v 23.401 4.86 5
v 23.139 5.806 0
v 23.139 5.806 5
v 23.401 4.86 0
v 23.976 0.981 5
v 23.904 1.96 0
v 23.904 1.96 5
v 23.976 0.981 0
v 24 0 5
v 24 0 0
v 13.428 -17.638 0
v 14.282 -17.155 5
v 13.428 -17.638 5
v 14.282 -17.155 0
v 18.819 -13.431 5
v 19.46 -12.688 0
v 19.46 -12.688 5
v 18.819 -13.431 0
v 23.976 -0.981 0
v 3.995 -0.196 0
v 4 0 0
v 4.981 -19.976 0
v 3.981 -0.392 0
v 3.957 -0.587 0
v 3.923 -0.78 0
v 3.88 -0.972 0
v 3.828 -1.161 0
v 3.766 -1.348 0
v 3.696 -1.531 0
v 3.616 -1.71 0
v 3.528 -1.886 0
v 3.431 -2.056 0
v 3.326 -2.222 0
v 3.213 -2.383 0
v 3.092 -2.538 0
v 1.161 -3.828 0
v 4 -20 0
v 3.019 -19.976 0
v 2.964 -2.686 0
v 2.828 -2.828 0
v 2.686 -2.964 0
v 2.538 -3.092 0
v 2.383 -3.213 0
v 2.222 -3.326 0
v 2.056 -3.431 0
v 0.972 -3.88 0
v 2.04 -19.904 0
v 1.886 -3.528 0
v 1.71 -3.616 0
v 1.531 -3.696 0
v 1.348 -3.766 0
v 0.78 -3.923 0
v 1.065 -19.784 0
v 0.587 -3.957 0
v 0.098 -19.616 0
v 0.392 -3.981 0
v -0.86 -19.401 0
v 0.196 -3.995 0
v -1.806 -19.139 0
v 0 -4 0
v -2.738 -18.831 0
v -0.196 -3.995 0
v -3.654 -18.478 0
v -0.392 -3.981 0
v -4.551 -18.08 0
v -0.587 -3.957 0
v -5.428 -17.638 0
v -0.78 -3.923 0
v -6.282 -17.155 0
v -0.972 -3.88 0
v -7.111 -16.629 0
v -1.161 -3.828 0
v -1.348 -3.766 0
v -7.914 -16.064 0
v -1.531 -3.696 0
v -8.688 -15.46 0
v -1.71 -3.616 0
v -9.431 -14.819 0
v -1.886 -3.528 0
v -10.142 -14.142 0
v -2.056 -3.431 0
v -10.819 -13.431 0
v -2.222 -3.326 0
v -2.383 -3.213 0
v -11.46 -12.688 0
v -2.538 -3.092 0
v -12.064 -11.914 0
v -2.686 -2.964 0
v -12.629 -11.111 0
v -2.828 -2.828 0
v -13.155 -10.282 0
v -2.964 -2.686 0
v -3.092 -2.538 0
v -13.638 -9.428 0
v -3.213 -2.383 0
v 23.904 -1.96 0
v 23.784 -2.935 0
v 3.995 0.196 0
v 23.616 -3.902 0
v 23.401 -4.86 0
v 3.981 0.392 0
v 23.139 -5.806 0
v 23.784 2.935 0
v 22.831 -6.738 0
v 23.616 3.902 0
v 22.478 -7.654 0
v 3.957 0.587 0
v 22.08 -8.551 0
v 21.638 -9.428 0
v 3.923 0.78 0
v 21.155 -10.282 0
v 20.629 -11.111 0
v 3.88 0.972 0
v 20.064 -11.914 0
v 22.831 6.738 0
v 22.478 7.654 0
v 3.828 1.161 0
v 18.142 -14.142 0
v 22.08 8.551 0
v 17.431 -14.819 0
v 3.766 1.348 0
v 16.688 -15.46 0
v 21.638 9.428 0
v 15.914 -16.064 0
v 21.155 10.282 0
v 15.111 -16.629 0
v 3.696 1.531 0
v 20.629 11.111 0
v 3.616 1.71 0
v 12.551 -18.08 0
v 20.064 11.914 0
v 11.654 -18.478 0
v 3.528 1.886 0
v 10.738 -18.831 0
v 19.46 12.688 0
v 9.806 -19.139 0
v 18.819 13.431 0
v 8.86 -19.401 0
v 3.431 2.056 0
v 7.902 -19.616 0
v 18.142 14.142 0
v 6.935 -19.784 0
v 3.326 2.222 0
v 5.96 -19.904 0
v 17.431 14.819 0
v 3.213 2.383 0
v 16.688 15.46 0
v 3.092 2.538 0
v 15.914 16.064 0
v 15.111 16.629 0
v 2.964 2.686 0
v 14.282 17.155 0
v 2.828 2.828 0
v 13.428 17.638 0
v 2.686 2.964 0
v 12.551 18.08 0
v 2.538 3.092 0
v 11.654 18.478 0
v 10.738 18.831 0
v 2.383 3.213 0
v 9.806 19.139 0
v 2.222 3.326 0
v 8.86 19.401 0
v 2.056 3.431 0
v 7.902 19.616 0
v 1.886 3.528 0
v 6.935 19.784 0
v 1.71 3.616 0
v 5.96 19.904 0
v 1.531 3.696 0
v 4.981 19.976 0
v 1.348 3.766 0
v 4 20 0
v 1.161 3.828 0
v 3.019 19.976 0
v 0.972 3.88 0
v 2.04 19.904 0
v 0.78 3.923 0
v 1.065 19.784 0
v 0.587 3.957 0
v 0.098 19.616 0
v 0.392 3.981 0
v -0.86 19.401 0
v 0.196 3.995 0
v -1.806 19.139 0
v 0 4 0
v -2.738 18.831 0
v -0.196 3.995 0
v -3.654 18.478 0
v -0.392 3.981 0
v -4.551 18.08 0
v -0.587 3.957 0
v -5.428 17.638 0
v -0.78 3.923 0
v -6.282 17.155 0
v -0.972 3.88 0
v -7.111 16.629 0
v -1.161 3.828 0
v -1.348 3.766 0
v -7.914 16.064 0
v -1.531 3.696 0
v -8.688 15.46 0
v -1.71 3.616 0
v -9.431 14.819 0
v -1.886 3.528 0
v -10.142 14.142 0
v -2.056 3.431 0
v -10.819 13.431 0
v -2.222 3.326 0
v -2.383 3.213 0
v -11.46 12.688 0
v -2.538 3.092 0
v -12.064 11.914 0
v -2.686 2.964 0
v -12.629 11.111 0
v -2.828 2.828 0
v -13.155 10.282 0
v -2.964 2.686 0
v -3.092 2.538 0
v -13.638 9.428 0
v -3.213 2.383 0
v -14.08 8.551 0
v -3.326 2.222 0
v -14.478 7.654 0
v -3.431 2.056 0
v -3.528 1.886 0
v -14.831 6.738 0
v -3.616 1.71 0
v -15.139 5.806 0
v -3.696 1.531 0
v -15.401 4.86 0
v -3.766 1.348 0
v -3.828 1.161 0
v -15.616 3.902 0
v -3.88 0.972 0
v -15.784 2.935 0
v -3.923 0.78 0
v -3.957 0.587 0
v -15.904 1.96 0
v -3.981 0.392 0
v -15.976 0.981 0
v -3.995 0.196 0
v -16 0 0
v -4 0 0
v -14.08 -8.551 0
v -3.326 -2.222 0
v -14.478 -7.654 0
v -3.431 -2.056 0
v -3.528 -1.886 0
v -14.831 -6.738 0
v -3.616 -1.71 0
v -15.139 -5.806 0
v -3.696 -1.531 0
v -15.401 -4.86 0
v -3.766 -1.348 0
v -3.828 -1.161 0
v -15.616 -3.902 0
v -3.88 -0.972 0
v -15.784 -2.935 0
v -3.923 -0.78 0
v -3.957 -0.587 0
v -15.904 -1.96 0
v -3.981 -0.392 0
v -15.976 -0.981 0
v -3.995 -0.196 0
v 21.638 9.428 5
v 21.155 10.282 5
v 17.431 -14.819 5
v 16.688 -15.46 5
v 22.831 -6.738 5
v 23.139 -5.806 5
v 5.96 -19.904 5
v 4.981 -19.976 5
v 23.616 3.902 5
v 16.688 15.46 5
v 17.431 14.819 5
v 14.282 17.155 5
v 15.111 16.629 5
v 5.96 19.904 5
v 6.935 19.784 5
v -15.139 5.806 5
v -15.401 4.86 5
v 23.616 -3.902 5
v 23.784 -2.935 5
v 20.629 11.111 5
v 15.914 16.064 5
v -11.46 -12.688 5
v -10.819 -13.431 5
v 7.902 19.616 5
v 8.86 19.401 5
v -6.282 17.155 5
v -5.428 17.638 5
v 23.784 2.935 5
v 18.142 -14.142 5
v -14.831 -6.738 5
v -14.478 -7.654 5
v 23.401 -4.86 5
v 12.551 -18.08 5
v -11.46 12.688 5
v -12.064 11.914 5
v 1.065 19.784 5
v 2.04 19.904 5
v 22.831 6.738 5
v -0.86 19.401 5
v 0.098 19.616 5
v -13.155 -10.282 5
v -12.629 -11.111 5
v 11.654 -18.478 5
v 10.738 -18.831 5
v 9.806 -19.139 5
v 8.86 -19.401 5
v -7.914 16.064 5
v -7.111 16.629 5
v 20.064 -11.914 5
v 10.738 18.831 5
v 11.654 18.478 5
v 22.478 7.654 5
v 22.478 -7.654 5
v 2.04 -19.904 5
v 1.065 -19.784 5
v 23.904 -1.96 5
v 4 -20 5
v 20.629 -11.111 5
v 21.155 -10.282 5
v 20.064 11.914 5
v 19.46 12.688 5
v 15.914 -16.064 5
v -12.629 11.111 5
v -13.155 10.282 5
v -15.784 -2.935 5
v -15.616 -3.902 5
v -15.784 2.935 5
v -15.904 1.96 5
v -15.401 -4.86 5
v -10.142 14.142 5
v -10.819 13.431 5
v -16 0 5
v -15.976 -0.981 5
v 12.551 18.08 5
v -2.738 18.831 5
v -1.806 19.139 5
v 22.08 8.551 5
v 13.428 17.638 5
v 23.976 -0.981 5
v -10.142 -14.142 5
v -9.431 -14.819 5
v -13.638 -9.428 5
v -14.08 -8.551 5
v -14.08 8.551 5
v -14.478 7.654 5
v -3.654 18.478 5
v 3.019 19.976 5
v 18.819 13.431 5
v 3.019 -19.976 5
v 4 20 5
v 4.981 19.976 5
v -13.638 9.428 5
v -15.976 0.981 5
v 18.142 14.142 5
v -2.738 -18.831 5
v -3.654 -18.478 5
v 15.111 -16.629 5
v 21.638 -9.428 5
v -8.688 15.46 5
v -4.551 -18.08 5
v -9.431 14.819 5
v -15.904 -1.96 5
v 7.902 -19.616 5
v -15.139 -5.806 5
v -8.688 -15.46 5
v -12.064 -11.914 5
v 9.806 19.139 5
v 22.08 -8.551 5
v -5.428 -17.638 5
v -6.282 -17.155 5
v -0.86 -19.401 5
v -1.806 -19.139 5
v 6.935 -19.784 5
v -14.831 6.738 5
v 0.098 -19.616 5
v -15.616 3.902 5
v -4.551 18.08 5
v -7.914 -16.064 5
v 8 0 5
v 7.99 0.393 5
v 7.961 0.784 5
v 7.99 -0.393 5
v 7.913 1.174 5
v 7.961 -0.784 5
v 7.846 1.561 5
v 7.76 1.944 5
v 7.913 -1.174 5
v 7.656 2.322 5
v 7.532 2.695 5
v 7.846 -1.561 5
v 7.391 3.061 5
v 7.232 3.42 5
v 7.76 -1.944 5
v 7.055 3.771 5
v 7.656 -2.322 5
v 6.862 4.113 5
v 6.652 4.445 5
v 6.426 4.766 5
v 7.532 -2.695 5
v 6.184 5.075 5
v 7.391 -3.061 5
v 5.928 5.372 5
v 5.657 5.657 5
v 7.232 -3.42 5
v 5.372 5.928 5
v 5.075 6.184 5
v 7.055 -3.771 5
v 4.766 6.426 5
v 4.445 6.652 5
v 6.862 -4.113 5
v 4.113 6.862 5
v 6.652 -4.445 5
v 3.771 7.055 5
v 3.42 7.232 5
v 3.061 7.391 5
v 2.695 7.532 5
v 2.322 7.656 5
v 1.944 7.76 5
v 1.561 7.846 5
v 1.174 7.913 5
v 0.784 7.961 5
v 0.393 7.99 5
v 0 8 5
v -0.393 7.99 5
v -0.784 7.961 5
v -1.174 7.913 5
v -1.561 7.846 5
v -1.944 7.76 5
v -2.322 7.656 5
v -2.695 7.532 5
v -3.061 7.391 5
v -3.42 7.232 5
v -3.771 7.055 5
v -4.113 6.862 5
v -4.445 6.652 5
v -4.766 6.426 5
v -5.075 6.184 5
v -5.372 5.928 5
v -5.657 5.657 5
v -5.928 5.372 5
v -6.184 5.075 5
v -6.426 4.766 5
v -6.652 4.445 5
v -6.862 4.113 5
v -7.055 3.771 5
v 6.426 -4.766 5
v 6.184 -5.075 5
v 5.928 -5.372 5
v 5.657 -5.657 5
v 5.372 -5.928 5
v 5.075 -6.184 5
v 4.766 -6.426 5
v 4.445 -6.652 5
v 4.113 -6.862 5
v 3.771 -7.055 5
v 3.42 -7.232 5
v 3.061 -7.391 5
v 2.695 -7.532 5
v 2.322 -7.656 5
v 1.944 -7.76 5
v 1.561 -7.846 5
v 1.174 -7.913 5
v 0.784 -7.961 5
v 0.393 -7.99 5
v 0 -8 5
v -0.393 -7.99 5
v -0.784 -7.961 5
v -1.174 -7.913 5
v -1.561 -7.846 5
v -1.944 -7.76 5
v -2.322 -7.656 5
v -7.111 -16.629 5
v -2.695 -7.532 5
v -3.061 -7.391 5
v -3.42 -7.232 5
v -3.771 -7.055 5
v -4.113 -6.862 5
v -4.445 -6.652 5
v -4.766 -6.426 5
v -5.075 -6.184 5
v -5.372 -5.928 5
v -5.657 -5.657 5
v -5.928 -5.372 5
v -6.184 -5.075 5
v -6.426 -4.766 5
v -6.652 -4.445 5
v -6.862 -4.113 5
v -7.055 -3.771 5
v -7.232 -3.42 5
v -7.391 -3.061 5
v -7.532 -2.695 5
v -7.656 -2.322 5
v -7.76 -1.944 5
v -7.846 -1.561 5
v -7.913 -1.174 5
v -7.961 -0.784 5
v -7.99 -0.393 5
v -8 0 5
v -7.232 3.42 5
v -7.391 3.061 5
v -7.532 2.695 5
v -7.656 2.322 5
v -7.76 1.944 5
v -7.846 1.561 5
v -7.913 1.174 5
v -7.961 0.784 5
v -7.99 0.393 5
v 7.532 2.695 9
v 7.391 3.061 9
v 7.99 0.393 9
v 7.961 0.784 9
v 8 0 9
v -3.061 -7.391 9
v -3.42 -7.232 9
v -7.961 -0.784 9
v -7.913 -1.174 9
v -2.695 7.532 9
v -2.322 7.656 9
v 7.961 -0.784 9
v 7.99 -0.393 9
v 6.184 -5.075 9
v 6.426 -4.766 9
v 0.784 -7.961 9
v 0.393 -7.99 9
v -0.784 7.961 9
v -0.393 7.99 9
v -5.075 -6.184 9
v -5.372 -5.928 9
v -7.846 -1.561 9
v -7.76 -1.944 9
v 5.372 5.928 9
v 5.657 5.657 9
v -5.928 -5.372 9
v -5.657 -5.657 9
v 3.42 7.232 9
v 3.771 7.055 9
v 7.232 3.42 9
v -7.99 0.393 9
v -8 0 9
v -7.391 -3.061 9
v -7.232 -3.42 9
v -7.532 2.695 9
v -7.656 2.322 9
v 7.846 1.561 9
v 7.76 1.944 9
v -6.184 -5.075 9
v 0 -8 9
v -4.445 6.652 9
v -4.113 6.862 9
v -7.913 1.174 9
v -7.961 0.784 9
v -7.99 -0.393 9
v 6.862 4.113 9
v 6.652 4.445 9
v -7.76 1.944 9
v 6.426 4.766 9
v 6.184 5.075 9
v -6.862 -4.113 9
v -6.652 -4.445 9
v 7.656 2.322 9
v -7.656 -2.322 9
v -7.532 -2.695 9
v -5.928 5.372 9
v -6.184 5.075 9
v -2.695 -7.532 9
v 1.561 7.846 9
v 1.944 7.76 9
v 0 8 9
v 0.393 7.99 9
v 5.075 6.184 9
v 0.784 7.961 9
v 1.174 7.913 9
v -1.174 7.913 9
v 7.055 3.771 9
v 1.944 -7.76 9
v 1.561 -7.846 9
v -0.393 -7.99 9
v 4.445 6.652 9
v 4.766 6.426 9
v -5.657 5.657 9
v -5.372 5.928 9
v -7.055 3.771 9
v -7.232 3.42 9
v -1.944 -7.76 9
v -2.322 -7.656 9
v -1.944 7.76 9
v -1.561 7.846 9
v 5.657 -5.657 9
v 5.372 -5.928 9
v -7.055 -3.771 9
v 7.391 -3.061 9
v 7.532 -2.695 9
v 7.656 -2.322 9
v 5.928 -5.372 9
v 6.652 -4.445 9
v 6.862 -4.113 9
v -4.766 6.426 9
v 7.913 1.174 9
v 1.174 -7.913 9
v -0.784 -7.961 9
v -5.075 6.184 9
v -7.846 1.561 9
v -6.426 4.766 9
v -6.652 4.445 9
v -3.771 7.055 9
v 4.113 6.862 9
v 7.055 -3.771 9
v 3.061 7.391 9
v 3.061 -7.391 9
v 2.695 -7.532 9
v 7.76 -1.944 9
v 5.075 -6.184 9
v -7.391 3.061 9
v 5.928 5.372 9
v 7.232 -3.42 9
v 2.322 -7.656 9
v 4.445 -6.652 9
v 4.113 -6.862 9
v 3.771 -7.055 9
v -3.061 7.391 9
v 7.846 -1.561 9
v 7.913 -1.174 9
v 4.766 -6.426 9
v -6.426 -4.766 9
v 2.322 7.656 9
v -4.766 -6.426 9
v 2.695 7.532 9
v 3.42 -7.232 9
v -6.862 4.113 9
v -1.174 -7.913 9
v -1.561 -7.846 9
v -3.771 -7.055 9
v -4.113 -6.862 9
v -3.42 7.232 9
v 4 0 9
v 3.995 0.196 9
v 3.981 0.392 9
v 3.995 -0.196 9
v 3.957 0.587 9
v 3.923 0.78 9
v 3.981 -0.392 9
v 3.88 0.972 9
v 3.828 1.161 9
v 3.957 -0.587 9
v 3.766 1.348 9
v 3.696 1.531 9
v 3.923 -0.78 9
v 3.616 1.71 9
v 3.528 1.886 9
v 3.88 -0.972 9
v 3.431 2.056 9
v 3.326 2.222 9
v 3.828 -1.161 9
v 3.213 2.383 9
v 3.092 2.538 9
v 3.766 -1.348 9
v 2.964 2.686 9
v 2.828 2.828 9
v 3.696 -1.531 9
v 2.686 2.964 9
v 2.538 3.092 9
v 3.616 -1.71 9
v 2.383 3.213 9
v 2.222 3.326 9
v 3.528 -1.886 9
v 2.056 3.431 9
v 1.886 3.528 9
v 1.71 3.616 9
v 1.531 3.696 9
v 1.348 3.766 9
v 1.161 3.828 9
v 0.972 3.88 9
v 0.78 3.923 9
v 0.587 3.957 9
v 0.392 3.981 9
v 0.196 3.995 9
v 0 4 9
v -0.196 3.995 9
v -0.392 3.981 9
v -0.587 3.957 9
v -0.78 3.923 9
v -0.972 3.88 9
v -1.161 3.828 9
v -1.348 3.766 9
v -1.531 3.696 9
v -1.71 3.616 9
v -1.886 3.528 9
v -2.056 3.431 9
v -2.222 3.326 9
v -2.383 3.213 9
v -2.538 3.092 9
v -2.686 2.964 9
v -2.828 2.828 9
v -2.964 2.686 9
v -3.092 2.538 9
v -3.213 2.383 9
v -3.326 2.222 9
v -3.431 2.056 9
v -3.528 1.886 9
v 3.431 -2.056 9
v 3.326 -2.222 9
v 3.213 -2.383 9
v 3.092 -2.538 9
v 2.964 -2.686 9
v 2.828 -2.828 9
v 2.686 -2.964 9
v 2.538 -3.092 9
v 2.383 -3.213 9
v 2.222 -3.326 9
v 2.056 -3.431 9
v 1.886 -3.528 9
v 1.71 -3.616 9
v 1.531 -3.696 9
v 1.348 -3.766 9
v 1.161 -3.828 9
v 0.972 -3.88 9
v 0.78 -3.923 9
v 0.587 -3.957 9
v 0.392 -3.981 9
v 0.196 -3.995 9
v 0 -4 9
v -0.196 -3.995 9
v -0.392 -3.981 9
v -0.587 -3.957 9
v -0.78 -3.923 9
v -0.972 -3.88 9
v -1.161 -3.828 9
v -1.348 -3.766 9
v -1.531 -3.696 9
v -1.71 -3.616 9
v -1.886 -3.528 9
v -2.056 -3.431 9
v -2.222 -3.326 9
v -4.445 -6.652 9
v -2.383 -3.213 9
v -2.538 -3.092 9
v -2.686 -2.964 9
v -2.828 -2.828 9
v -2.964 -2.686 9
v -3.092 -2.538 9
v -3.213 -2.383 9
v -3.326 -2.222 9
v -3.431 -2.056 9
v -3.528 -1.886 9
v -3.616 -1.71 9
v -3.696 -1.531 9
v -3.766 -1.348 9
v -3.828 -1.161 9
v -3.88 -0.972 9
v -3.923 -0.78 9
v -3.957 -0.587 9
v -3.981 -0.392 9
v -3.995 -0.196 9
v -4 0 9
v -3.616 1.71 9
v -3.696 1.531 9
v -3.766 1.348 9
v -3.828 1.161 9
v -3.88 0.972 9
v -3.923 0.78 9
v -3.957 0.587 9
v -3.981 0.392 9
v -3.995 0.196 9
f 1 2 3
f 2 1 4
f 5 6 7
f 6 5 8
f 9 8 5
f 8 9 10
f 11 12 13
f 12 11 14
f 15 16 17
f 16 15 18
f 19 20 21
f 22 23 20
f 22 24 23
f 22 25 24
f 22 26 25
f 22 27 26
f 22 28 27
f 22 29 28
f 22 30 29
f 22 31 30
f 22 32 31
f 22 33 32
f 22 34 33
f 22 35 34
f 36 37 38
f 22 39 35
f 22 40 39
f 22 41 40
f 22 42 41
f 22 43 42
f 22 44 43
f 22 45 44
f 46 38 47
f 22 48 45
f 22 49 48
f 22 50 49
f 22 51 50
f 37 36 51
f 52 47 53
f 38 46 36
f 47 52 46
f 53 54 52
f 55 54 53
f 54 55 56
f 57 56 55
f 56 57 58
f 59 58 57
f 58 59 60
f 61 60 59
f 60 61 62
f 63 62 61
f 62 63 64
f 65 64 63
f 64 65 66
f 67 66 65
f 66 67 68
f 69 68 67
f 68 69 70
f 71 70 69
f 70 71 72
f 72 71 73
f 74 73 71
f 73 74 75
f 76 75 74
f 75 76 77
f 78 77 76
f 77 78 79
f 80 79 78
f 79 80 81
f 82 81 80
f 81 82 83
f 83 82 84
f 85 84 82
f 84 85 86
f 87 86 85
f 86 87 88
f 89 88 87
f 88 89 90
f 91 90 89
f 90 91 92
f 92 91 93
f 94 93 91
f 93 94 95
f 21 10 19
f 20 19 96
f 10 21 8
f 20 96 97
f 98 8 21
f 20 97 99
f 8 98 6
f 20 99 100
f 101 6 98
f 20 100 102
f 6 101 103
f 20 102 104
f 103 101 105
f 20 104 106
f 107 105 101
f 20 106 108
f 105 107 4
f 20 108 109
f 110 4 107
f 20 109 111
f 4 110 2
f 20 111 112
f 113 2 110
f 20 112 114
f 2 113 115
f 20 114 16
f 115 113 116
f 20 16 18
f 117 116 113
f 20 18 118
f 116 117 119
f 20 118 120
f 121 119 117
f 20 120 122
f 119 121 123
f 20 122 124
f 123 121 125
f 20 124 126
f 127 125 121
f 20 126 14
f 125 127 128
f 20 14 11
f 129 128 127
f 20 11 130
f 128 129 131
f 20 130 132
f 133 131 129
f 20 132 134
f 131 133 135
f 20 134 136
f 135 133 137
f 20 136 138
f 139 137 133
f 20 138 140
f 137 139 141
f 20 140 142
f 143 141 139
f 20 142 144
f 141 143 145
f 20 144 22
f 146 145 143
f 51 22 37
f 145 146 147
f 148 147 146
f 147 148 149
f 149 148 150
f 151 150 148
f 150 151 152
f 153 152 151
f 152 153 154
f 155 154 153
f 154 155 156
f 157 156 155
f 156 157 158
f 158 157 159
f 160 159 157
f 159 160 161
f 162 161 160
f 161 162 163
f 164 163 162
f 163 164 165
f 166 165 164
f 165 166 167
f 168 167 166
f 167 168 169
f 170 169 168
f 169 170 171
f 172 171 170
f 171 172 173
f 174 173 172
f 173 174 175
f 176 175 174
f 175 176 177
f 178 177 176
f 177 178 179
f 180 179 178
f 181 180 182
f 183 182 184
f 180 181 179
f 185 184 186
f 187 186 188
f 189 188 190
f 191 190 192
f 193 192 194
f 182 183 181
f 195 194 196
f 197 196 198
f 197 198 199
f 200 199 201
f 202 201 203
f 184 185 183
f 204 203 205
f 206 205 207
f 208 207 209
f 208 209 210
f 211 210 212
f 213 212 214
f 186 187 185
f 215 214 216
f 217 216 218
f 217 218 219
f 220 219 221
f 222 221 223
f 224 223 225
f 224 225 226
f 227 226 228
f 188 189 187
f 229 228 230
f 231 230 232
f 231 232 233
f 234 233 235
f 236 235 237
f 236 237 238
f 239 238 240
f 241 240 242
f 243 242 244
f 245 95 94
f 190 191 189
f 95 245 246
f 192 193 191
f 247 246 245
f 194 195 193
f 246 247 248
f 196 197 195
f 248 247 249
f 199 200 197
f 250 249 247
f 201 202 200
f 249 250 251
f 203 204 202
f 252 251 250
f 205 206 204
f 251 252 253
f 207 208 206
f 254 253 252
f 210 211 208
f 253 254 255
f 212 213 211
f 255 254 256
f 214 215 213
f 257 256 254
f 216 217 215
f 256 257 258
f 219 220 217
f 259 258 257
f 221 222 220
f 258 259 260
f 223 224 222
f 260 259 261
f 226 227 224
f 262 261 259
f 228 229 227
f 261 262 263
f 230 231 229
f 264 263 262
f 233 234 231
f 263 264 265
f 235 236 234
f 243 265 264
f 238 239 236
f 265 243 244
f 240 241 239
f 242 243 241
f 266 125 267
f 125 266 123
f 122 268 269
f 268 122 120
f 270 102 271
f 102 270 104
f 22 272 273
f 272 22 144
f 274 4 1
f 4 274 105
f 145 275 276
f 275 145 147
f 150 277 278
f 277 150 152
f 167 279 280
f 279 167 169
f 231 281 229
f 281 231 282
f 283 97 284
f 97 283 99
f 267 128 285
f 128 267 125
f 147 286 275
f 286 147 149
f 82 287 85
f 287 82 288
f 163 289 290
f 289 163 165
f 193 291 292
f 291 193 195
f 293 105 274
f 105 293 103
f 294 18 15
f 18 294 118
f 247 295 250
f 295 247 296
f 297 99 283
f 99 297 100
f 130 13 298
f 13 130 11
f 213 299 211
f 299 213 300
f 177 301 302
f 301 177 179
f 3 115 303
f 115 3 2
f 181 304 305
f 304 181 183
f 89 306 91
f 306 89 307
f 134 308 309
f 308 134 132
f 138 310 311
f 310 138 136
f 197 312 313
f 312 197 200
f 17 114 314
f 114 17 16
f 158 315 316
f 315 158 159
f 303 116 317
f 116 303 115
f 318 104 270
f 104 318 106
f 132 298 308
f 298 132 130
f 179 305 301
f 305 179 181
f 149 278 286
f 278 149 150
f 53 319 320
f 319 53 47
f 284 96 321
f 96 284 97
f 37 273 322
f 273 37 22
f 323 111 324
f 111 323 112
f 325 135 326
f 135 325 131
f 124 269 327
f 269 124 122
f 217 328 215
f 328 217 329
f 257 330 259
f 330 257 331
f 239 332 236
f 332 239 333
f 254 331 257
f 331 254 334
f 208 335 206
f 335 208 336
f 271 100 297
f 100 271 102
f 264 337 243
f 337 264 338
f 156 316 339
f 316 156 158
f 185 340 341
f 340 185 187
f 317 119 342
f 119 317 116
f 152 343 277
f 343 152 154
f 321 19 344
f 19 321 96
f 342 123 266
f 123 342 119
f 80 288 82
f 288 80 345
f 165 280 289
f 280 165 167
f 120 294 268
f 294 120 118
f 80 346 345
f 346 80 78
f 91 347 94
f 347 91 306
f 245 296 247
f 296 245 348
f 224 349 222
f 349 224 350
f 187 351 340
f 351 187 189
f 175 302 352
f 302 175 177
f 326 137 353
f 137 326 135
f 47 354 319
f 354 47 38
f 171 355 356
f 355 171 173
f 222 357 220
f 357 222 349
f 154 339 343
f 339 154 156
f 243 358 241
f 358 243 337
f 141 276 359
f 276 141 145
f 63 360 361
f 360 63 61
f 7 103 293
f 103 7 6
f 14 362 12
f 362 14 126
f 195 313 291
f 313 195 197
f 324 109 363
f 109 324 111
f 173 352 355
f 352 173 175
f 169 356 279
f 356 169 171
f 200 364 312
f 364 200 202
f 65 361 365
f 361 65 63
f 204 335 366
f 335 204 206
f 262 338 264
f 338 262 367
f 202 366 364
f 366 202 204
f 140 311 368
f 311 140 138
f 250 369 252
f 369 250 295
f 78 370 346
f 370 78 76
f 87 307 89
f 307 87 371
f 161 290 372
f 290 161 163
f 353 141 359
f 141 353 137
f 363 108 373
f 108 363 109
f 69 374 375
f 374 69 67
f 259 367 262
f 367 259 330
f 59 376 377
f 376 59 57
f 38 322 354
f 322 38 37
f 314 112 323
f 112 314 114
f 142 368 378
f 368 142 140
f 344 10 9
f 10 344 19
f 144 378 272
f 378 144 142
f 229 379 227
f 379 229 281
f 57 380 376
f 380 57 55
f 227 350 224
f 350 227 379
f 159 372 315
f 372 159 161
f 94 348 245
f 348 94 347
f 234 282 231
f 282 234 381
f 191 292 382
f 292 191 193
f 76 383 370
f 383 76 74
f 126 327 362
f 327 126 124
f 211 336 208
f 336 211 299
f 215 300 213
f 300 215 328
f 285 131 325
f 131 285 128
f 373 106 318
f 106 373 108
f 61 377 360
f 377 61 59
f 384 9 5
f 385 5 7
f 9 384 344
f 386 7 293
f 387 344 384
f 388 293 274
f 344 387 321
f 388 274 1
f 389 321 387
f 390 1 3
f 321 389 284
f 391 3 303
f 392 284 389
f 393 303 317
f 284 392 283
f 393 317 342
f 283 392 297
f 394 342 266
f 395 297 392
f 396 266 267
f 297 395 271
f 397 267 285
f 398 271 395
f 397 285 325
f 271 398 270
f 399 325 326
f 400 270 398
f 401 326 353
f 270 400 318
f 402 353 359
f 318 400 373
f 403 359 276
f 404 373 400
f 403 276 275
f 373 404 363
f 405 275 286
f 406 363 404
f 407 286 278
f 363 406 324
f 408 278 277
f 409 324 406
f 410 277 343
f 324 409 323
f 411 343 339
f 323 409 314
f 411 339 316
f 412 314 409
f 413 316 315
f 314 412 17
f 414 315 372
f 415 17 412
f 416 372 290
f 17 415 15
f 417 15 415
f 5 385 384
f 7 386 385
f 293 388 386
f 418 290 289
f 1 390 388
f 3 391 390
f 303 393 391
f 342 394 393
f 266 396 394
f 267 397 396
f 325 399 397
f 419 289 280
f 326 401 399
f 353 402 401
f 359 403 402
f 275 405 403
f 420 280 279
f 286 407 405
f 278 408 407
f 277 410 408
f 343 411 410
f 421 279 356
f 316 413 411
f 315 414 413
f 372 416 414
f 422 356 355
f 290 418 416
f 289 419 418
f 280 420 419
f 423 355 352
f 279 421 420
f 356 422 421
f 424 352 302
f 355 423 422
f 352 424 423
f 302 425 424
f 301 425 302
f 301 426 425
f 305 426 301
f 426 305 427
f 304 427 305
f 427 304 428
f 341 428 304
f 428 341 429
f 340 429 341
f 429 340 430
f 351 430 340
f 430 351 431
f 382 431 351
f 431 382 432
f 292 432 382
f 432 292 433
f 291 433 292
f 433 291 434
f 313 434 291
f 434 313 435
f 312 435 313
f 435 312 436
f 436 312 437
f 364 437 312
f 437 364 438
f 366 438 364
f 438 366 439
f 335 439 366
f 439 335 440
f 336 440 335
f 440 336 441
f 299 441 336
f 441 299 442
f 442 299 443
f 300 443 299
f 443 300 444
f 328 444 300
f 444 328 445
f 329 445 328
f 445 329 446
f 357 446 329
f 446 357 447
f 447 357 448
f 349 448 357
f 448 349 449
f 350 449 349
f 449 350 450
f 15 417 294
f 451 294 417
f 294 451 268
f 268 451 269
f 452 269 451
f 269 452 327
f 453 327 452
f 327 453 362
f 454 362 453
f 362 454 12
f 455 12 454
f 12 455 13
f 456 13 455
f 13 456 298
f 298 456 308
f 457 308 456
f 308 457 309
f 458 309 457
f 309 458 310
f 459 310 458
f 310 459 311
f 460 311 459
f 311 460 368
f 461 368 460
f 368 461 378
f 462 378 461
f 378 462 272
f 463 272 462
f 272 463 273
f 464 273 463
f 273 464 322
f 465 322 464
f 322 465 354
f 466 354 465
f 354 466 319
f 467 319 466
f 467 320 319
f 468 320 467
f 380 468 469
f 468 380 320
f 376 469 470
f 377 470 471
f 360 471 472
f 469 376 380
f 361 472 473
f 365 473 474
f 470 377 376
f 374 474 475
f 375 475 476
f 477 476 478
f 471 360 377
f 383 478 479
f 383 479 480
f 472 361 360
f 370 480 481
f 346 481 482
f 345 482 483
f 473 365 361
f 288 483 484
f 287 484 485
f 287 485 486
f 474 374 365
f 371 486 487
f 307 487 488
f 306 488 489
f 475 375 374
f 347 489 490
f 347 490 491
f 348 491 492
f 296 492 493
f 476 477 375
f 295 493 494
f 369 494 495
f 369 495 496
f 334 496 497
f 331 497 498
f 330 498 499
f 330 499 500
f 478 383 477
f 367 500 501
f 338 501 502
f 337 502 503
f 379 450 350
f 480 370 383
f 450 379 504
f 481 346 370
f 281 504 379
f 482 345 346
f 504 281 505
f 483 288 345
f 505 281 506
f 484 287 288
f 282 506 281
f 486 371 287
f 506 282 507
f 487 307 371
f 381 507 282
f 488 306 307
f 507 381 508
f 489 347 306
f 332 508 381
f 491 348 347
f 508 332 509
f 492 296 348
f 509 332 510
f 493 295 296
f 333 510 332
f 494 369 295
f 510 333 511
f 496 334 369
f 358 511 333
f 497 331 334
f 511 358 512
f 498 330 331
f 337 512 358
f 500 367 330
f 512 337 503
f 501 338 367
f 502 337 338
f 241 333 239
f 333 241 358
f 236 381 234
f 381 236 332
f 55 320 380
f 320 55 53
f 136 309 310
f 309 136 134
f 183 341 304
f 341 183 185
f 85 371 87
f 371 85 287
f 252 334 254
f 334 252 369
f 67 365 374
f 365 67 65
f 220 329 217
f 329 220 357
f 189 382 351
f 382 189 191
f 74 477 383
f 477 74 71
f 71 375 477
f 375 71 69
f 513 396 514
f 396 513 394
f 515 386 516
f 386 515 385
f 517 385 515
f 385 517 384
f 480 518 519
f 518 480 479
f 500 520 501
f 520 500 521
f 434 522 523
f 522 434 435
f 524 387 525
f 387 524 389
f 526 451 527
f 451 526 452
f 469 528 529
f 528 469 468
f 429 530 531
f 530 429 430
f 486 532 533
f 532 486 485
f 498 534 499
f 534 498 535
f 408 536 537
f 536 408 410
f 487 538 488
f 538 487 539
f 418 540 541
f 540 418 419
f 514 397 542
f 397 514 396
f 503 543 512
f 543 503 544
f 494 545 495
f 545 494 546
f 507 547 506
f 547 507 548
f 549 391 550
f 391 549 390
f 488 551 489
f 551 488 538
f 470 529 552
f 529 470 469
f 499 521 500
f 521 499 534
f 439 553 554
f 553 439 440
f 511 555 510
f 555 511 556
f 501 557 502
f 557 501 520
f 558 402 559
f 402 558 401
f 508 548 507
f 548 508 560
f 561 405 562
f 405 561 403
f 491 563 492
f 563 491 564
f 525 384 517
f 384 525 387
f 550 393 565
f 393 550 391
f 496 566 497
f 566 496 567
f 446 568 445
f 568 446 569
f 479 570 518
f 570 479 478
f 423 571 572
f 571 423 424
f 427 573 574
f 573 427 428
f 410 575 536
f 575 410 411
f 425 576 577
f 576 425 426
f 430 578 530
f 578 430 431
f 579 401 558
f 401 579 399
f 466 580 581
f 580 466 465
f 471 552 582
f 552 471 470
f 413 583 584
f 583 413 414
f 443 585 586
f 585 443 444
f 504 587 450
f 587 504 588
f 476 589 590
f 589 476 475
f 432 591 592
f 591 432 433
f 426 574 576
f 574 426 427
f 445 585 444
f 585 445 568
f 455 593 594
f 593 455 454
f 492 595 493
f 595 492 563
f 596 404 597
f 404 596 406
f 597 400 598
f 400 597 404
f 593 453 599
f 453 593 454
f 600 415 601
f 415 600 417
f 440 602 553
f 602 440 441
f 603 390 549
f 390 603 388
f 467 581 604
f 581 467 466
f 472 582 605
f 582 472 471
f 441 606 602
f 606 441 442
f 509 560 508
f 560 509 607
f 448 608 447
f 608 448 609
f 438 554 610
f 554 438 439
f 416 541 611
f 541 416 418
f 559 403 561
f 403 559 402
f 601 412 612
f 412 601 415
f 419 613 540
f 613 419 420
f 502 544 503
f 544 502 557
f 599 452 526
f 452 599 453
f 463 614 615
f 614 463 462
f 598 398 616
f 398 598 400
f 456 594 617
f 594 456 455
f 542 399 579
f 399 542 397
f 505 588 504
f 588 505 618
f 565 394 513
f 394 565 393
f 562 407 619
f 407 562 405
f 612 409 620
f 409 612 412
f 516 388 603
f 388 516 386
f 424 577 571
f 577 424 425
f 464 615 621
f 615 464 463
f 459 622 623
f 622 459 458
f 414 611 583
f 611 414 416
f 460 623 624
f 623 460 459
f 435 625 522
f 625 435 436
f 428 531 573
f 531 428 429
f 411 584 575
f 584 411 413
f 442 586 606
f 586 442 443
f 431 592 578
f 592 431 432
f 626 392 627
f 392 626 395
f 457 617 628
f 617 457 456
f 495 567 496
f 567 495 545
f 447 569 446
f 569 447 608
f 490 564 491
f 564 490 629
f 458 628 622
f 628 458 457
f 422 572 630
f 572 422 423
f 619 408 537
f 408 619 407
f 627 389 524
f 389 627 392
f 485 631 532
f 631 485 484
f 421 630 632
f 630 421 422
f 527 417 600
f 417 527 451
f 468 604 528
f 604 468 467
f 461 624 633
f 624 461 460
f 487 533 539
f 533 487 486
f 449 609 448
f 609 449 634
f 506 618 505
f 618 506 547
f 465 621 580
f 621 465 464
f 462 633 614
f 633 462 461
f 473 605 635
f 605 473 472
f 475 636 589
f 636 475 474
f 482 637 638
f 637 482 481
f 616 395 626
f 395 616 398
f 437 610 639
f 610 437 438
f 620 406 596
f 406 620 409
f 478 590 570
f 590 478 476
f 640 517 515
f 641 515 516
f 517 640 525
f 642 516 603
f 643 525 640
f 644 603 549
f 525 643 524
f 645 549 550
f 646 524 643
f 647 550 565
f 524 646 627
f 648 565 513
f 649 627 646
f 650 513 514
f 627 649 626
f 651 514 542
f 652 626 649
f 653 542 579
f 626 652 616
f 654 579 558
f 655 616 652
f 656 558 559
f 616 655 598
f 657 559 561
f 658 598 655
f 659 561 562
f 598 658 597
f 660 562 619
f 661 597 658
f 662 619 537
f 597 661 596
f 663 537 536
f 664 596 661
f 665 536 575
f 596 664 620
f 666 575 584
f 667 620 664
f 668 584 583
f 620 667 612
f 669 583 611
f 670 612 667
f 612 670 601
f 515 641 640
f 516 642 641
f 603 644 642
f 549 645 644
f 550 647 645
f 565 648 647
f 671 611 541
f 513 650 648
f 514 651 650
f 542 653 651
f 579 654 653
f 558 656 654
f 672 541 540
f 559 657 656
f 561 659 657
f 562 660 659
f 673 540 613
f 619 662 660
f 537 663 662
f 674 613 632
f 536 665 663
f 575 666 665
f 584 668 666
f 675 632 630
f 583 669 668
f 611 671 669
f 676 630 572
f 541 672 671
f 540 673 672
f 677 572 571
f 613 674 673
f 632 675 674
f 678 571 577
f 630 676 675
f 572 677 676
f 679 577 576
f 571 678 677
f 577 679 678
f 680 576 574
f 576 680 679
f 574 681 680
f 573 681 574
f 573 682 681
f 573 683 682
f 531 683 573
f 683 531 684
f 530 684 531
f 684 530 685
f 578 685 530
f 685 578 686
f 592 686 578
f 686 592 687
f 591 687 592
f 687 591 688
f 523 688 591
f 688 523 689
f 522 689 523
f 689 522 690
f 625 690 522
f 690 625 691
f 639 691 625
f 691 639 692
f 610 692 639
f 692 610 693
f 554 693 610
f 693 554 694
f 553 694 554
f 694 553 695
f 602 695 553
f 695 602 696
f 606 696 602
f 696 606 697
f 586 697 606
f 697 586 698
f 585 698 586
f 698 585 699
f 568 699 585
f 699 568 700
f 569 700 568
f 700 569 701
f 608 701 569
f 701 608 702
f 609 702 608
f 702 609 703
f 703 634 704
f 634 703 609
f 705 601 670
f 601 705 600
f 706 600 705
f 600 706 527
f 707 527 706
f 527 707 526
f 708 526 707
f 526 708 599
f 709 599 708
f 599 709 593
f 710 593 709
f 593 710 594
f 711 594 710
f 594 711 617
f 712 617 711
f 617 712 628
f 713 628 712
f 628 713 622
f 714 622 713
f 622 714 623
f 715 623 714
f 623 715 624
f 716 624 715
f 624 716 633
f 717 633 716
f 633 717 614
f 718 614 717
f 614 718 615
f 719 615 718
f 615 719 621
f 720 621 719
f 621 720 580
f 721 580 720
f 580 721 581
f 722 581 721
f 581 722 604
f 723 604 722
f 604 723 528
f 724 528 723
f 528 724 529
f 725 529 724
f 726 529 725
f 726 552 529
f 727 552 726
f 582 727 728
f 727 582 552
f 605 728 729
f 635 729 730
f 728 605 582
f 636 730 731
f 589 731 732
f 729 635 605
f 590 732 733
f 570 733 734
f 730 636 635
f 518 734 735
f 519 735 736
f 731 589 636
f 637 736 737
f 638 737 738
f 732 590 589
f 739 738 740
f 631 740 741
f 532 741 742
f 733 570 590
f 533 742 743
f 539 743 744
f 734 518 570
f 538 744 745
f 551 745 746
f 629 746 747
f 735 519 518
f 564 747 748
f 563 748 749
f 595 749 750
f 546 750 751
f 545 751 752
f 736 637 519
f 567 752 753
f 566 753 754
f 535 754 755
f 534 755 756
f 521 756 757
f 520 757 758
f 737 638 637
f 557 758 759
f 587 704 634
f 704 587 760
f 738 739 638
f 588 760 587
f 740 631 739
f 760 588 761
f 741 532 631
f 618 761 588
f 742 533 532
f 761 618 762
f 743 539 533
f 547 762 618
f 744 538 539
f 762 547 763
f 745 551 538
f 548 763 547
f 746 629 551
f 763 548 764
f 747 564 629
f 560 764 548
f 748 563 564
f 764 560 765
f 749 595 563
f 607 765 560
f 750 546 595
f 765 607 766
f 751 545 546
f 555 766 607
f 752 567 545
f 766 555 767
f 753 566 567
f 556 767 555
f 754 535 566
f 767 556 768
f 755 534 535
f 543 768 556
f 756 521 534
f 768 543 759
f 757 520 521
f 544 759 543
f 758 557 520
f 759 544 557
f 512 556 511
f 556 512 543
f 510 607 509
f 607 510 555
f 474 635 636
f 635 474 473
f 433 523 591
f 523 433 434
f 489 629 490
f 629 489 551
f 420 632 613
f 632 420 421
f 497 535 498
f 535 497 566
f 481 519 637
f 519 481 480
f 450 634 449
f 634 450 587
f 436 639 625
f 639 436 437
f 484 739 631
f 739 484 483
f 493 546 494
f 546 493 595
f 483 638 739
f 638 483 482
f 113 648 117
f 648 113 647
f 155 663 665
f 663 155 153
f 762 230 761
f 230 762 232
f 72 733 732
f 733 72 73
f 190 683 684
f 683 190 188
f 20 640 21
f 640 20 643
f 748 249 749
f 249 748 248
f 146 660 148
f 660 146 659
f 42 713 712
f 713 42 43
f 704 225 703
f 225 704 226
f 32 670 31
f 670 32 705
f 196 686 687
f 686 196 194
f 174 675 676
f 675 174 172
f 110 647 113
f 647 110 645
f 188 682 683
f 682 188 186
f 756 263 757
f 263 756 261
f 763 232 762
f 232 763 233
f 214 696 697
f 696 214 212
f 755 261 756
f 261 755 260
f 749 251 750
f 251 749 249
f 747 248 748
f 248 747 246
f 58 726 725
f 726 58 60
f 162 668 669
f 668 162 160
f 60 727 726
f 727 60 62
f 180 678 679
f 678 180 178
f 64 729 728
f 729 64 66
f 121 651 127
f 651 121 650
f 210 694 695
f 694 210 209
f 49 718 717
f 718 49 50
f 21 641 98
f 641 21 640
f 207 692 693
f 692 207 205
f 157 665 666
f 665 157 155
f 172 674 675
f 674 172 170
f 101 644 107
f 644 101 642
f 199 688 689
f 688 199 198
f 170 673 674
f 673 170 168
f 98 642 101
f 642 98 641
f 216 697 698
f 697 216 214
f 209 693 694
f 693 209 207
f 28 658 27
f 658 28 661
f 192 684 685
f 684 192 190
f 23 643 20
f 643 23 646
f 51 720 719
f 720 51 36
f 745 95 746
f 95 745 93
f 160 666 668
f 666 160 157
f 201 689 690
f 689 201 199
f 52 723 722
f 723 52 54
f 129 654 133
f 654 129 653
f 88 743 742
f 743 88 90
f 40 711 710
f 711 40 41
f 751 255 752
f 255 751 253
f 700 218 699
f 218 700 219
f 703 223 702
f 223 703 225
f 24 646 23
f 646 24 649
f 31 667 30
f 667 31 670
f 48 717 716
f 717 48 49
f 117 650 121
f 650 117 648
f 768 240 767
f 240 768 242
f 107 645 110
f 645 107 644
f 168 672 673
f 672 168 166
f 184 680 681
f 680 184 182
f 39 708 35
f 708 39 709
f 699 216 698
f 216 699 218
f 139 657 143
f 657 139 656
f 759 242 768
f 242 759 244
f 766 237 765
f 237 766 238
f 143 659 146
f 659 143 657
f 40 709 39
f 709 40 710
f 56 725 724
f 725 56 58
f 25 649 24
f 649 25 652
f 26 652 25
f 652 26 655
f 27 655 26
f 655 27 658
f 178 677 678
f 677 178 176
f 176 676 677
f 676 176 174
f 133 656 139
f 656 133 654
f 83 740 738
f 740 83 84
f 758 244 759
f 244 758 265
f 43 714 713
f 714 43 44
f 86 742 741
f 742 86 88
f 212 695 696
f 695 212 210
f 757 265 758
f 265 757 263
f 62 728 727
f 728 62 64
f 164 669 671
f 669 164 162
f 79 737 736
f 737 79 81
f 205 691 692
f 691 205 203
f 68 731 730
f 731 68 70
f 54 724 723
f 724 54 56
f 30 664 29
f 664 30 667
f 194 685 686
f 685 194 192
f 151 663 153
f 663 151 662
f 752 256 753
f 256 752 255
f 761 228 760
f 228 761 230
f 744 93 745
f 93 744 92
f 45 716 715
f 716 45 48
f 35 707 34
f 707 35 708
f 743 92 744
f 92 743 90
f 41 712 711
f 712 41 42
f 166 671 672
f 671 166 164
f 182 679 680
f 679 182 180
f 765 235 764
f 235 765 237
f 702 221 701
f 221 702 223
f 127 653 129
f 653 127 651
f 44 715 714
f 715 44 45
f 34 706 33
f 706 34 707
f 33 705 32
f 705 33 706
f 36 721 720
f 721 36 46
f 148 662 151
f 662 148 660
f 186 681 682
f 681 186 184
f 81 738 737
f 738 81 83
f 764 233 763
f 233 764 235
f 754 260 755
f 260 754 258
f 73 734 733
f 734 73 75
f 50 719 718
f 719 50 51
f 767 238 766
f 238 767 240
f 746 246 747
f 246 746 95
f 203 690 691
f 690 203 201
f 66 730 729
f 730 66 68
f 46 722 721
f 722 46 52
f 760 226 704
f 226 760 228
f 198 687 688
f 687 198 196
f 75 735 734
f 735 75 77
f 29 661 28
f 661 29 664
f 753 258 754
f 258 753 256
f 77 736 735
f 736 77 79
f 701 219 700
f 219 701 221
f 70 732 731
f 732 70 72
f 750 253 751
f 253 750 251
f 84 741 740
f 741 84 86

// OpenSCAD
// Eccentric cam for shaker mechanism
// Print orientation: disc flat on bed (z = 0), hub upward.
// Shaft axis = Z axis (origin). Disc centre offset in +X.

$fn = 128;

// --- Disc ---
disc_d      = 40;   // cam disc diameter
disc_t      = 5;    // cam disc thickness
eccentric   = 4;    // offset of disc centre from shaft axis (X)

// --- Hub ---
hub_d       = 16;   // hub diameter (on shaft axis)
hub_h       = 4;    // hub height above disc (z = 5 to 9)

// --- Shaft bore ---
bore_d      = 8;    // shaft hole diameter

// --- Misc ---
eps         = 0.5;  // overcut for clean boolean differences

difference() {
    union() {
        // Eccentric disc
        translate([eccentric, 0, 0])
            cylinder(d = disc_d, h = disc_t);

        // Hub on shaft axis (slightly overlaps disc for a solid union)
        translate([0, 0, disc_t - 0.01])
            cylinder(d = hub_d, h = hub_h + 0.01);
    }

    // Shaft bore through hub and disc
    translate([0, 0, -eps])
        cylinder(d = bore_d, h = disc_t + hub_h + 2 * eps);
}
